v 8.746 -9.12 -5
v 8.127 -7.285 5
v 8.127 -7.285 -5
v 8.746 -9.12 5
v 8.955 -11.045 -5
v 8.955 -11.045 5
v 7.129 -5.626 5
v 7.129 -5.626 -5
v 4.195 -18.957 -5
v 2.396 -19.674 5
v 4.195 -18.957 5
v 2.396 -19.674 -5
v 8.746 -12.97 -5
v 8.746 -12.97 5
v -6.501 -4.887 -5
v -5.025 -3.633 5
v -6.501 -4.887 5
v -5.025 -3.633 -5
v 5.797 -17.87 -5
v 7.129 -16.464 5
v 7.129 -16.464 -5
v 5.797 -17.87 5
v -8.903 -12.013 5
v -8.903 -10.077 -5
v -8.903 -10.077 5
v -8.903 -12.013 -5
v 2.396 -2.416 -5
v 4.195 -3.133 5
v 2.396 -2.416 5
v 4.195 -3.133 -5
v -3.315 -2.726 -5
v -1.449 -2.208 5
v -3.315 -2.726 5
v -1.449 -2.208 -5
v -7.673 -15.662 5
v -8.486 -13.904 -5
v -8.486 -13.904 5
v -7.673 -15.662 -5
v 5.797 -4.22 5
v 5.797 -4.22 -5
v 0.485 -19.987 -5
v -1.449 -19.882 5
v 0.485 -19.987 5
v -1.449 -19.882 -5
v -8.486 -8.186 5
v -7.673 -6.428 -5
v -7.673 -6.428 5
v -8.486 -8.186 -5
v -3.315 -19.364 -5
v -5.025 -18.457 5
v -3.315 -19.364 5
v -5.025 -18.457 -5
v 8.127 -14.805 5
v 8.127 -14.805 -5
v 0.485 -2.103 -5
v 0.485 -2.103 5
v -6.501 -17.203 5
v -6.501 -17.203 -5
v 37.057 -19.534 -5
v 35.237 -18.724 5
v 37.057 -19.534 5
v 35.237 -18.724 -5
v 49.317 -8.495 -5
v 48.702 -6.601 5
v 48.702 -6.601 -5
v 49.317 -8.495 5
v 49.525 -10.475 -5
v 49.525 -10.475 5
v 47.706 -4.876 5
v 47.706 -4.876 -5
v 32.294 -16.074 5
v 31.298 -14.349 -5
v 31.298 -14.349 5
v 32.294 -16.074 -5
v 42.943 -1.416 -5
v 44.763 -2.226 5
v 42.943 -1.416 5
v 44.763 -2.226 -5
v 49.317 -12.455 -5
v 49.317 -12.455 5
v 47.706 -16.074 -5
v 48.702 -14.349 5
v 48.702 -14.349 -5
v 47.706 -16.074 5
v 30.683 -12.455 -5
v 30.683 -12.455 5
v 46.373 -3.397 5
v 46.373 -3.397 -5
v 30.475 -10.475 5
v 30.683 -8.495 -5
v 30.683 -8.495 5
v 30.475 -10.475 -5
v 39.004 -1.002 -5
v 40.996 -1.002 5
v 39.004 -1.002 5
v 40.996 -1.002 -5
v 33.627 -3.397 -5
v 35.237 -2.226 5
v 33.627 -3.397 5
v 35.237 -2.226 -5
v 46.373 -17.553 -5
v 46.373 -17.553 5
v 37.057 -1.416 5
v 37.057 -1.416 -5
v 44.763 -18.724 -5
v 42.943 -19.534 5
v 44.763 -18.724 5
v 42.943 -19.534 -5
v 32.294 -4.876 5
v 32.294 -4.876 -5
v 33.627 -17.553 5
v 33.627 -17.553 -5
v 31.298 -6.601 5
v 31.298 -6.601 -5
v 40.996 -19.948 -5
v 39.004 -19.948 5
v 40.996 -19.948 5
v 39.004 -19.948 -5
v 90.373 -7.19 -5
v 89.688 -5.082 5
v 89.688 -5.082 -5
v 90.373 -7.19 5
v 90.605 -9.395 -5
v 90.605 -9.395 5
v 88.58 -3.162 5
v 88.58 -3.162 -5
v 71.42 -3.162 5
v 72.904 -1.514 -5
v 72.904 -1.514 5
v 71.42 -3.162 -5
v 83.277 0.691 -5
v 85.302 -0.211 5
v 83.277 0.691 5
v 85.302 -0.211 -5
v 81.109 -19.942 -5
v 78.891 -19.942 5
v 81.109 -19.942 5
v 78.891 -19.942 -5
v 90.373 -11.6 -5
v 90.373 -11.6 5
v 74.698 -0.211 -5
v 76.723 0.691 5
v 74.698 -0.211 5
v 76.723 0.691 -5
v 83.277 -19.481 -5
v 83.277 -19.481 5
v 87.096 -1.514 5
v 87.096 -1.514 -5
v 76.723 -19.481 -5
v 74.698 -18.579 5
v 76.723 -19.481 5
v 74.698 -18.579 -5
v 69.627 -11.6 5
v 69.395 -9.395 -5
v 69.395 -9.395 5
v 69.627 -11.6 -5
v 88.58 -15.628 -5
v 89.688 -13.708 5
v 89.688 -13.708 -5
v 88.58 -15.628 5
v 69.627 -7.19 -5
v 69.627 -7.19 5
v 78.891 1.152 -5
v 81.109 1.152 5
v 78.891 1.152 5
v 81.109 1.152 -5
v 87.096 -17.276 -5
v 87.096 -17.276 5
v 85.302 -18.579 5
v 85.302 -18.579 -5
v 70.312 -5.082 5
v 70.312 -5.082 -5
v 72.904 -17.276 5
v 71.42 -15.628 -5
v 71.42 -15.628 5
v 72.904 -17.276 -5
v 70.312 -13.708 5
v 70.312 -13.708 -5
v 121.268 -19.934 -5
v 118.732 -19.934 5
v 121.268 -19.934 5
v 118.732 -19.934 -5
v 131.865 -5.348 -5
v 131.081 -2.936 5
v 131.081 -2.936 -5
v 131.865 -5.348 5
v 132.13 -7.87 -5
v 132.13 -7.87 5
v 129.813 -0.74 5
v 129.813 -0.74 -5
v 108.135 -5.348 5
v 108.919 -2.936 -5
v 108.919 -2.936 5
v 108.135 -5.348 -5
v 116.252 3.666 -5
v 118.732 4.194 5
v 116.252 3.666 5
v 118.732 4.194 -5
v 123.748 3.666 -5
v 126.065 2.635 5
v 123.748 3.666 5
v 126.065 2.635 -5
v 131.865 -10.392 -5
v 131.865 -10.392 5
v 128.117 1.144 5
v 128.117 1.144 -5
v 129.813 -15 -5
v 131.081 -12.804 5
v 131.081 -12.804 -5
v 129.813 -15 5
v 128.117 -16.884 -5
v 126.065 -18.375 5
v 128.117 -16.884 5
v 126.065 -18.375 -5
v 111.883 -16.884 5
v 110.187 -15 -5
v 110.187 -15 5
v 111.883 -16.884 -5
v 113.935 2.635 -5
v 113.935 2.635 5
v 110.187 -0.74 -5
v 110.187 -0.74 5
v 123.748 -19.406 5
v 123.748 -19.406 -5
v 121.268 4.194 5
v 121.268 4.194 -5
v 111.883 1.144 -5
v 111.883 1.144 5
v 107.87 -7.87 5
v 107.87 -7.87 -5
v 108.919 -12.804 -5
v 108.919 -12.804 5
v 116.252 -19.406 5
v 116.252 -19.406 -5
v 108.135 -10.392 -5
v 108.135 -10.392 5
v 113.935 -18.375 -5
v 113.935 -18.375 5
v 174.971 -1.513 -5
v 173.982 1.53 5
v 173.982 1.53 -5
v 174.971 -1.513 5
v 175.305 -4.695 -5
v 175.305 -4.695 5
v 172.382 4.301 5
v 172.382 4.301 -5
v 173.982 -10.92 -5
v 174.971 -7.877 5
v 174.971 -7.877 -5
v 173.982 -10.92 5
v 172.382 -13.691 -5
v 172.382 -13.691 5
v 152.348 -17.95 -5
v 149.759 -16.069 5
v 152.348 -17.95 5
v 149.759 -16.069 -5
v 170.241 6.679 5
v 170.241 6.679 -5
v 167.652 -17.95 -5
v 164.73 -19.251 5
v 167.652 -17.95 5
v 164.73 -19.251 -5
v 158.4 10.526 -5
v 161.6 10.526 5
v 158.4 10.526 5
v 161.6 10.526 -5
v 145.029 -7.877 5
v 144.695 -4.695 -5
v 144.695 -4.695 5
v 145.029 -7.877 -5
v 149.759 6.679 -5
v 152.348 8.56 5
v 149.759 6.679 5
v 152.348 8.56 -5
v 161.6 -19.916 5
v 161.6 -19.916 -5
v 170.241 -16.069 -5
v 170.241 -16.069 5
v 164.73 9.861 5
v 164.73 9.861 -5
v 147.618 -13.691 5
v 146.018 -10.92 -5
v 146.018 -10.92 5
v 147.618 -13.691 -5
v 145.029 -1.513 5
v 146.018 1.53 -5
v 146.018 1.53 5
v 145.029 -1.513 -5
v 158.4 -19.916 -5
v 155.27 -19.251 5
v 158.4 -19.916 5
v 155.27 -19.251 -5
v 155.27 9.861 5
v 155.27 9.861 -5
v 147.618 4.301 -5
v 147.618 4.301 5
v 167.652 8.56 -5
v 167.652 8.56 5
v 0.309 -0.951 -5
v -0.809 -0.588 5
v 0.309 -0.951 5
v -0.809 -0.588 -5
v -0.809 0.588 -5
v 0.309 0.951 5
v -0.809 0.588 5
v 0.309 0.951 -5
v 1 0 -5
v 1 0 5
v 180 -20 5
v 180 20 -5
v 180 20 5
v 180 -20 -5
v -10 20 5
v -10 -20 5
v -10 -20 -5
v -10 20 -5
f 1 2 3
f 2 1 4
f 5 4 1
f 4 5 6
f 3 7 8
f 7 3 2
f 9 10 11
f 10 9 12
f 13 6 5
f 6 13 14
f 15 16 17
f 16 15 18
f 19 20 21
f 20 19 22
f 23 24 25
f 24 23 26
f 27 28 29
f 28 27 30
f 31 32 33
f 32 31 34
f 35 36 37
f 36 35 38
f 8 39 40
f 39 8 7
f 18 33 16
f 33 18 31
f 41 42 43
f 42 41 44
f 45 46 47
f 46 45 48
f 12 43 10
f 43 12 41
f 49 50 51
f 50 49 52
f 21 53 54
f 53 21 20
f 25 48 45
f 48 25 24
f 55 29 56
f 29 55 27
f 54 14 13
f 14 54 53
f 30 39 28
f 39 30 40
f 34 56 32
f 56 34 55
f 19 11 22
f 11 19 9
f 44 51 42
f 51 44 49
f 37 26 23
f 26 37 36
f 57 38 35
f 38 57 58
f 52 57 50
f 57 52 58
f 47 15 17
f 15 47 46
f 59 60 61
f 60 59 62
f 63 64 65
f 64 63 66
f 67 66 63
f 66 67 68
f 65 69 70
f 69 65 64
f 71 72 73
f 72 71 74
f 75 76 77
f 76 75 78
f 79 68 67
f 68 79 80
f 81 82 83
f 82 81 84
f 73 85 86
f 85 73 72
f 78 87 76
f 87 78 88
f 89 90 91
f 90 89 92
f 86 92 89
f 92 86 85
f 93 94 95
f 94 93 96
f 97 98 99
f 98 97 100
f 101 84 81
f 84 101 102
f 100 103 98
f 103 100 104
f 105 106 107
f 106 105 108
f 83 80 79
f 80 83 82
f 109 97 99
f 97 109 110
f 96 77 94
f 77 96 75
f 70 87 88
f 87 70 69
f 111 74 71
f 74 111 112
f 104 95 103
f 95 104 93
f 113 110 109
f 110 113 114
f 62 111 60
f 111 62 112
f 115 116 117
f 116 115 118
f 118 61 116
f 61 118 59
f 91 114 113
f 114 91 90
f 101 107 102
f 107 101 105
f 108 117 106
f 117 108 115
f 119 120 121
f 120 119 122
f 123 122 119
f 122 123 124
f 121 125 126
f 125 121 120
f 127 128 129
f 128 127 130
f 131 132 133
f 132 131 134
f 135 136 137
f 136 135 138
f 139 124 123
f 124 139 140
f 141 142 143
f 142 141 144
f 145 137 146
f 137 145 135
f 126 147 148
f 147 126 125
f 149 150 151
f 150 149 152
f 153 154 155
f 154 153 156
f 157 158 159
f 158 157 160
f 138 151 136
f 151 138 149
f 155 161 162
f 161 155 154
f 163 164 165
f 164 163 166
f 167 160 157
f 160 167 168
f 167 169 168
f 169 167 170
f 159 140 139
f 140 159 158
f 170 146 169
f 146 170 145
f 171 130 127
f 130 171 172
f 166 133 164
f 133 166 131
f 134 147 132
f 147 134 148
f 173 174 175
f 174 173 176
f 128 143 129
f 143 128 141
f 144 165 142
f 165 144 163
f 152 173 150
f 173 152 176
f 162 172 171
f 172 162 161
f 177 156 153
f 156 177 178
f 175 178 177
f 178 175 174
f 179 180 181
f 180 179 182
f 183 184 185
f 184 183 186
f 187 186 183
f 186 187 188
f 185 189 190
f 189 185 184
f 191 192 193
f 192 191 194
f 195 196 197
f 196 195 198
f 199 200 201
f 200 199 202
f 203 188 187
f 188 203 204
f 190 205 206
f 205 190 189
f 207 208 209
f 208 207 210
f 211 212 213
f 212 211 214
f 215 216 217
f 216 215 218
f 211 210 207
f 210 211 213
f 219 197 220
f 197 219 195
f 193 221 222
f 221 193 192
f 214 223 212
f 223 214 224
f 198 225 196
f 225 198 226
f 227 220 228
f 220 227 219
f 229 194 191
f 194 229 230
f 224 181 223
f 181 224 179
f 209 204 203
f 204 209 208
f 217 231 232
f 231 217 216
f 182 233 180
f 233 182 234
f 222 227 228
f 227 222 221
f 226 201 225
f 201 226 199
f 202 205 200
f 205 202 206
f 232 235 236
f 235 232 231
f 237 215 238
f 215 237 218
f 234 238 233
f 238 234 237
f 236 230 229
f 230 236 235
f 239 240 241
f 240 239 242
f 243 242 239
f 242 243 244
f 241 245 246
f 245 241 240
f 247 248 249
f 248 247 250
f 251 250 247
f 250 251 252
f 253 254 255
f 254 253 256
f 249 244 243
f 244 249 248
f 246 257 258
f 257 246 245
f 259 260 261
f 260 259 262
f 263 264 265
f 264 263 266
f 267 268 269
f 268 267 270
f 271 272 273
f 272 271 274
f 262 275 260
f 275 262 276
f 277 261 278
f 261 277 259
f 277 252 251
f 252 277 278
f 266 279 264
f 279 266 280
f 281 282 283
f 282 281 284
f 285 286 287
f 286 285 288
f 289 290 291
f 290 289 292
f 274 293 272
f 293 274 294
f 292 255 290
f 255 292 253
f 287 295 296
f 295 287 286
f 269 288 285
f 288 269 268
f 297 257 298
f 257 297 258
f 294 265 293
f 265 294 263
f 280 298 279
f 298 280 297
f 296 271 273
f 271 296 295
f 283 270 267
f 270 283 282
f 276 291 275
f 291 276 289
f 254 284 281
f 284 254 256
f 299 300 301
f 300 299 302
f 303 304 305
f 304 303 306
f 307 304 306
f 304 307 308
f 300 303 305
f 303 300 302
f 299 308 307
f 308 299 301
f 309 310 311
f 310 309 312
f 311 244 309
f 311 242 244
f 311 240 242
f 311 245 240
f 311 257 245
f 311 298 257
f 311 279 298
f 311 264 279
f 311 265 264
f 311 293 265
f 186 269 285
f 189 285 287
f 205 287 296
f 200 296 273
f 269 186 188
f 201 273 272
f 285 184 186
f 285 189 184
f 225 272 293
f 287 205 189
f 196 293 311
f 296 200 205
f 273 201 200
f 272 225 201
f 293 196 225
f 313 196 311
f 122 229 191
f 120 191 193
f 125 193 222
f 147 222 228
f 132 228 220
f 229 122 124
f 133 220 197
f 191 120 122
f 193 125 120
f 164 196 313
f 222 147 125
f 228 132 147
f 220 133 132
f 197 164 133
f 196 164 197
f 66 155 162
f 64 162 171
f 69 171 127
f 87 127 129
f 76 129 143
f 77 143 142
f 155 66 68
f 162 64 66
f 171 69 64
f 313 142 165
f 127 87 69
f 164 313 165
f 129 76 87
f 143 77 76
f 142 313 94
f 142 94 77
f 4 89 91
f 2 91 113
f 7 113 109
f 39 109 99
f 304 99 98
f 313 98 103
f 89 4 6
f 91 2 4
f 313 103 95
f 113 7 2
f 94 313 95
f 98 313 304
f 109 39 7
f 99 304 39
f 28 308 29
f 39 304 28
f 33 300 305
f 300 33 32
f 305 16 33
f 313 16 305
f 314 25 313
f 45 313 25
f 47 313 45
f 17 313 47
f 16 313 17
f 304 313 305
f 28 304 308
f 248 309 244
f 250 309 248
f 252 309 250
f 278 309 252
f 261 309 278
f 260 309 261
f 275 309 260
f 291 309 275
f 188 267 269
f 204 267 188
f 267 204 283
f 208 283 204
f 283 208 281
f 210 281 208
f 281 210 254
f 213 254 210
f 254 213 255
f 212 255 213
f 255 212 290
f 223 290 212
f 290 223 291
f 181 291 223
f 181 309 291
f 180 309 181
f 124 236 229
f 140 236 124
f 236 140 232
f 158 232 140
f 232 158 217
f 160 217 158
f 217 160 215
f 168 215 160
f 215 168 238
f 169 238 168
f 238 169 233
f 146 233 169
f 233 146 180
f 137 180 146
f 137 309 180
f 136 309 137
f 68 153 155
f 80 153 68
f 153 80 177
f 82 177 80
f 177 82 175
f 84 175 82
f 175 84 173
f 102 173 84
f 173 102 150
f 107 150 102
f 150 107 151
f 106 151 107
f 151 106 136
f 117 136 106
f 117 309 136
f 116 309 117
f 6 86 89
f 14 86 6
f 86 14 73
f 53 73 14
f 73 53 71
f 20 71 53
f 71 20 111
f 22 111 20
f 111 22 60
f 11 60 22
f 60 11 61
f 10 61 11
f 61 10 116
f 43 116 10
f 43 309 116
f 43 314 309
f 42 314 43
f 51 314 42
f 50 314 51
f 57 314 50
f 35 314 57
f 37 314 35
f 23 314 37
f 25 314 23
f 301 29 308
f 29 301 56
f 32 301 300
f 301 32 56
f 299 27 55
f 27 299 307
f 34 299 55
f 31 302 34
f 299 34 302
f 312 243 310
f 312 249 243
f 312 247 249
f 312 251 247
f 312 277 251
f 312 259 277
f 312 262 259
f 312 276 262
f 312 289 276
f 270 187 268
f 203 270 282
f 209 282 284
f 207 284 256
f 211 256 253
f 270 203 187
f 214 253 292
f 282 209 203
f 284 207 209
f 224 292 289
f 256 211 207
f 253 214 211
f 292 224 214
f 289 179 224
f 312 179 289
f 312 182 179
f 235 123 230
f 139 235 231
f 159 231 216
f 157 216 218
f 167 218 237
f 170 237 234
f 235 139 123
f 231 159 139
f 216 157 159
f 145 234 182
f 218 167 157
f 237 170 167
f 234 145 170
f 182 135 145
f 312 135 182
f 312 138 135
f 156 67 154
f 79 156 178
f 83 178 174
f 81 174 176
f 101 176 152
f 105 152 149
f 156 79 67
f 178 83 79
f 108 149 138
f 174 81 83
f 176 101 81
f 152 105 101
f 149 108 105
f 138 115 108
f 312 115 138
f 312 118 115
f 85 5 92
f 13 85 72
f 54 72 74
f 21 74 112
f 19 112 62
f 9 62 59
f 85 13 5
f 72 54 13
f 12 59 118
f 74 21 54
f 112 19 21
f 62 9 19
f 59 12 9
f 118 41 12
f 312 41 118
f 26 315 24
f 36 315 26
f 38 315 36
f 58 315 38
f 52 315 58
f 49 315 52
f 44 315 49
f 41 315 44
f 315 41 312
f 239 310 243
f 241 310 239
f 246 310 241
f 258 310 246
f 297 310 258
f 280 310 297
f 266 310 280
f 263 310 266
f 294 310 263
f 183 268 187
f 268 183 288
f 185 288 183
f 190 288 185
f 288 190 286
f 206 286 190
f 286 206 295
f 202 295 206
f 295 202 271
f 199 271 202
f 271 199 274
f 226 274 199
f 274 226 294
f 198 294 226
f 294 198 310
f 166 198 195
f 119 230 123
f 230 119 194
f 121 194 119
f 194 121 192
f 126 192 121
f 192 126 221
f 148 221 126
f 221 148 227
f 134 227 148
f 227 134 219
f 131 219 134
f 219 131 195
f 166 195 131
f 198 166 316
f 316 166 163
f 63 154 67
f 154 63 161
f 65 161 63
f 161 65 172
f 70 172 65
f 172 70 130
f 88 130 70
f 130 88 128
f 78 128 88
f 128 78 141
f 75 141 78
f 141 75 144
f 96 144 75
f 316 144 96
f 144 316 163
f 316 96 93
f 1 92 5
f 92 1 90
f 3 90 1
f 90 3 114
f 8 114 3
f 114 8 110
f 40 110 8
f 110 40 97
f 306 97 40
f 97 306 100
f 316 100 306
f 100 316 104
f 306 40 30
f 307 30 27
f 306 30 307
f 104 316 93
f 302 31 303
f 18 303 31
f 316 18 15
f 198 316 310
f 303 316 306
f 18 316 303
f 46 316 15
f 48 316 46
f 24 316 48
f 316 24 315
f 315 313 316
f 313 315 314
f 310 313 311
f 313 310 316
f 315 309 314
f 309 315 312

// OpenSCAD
tgtDetail = 180;


//cylinder(r=10,h=20,$fn=tgtDetail);

/*
for (i = [1:5]) {
    translate([ i * 40, 0, 0]) 
    scale([1, 1, i/5]) 
    cylinder(r=10,h=20,$fn=tgtDetail);
}
*/


dimensions = [17.91, 19.05, 21.21, 24.26, 30.61];
difference() {
    translate([85,0,0]) 
        cube([190,40,10],center=true);

    for (i = [0:5]) { 
        translate([i*40, 
                   dimensions[i]/2 - 20, 
                   0])
            cylinder(d=dimensions[i], 
                     h=30, 
                     center=true);
        } 
}

/*
module ring(outerR, innerR, tgtHeight) {
    difference() {
        cylinder(r=outerR, 
                 h=tgtHeight,
                 $fn=tgtDetail,
                 center=true);
        cylinder(r=innerR, 
                 h=tgtHeight+2,
                 $fn=tgtDetail,
                 center=true);
    }
}


ring(20, 16.5, 40);



color([0.25,0.25,1]) 
    translate([8,10,0]) 
    ring(20,16.5,40);

color([1,0.5,0.25]) 
    translate([8,10,0]) 
    ring(13.5,10,50);
*/
/*
intersection() {
    scale([30,30,30])
	cylinder (h=4, r=1, center=true, $fn=100);
    
    scale([30,30,30])
	rotate ([90,0,0]) 
    cylinder (h=4, r=0.9, center=true, $fn=100);
}
*/

/*

    for (j = [0:6]) {
        translate([i*30,j*30,0])
        scale([1,1,i+(j/6)])
        cylinder(r=10,h=20,$fn=tgtDetail);
    }
}
*/
/*


difference() {

    translate([85,0,0]) 
        cube([190,40,10],center=true);

    for (i = [0:5]){ 
        translate([i*40, 
                   dimensions[i]/2 - 20, 
                   0])
            cylinder(d=dimensions[i], 
                     h=30, 
                     center=true);
        }  
}
*/
/*
outerR = 10;
innerR = 5;
tgtHeight=10;
*/

/*

*/

             
             
//difference() {

//}


/*


*/
/*

     translate([i*50,0,0])
     scale([i*0.5+1,i*0.5+1,i*0.5+1])
        cylinder(r=20, h=30, $fn=tgtDetail, center=true);
}*/

/*
dimensions = [17.91,19.05,21.21,24.26,30.61];

*/
//cylinder(r=10, h=30, $fn=tgtDetail, center=true);
//translate([100,0,0]) rotate([10,20,30]) cube([caseX,caseY,caseZ],center=true);


/*

color([1,0.25,0.25]) translate([10,45,0]) ring(10,6.5,50);

//

//slide
color([0.25,0.25,1]) translate([8,10,0]) ring(20,16.5,50);
color([0.5,0.5,1]) translate([8,10,0]) ring(13.5,10,50);

*/
/*
//cover

*/
/*
intersection() {
	cylinder (h = 4, r=1, center = true, $fn=100);
	rotate ([90,0,0]) cylinder (h = 4, r=0.9, center = true, $fn=100);
}
*/
